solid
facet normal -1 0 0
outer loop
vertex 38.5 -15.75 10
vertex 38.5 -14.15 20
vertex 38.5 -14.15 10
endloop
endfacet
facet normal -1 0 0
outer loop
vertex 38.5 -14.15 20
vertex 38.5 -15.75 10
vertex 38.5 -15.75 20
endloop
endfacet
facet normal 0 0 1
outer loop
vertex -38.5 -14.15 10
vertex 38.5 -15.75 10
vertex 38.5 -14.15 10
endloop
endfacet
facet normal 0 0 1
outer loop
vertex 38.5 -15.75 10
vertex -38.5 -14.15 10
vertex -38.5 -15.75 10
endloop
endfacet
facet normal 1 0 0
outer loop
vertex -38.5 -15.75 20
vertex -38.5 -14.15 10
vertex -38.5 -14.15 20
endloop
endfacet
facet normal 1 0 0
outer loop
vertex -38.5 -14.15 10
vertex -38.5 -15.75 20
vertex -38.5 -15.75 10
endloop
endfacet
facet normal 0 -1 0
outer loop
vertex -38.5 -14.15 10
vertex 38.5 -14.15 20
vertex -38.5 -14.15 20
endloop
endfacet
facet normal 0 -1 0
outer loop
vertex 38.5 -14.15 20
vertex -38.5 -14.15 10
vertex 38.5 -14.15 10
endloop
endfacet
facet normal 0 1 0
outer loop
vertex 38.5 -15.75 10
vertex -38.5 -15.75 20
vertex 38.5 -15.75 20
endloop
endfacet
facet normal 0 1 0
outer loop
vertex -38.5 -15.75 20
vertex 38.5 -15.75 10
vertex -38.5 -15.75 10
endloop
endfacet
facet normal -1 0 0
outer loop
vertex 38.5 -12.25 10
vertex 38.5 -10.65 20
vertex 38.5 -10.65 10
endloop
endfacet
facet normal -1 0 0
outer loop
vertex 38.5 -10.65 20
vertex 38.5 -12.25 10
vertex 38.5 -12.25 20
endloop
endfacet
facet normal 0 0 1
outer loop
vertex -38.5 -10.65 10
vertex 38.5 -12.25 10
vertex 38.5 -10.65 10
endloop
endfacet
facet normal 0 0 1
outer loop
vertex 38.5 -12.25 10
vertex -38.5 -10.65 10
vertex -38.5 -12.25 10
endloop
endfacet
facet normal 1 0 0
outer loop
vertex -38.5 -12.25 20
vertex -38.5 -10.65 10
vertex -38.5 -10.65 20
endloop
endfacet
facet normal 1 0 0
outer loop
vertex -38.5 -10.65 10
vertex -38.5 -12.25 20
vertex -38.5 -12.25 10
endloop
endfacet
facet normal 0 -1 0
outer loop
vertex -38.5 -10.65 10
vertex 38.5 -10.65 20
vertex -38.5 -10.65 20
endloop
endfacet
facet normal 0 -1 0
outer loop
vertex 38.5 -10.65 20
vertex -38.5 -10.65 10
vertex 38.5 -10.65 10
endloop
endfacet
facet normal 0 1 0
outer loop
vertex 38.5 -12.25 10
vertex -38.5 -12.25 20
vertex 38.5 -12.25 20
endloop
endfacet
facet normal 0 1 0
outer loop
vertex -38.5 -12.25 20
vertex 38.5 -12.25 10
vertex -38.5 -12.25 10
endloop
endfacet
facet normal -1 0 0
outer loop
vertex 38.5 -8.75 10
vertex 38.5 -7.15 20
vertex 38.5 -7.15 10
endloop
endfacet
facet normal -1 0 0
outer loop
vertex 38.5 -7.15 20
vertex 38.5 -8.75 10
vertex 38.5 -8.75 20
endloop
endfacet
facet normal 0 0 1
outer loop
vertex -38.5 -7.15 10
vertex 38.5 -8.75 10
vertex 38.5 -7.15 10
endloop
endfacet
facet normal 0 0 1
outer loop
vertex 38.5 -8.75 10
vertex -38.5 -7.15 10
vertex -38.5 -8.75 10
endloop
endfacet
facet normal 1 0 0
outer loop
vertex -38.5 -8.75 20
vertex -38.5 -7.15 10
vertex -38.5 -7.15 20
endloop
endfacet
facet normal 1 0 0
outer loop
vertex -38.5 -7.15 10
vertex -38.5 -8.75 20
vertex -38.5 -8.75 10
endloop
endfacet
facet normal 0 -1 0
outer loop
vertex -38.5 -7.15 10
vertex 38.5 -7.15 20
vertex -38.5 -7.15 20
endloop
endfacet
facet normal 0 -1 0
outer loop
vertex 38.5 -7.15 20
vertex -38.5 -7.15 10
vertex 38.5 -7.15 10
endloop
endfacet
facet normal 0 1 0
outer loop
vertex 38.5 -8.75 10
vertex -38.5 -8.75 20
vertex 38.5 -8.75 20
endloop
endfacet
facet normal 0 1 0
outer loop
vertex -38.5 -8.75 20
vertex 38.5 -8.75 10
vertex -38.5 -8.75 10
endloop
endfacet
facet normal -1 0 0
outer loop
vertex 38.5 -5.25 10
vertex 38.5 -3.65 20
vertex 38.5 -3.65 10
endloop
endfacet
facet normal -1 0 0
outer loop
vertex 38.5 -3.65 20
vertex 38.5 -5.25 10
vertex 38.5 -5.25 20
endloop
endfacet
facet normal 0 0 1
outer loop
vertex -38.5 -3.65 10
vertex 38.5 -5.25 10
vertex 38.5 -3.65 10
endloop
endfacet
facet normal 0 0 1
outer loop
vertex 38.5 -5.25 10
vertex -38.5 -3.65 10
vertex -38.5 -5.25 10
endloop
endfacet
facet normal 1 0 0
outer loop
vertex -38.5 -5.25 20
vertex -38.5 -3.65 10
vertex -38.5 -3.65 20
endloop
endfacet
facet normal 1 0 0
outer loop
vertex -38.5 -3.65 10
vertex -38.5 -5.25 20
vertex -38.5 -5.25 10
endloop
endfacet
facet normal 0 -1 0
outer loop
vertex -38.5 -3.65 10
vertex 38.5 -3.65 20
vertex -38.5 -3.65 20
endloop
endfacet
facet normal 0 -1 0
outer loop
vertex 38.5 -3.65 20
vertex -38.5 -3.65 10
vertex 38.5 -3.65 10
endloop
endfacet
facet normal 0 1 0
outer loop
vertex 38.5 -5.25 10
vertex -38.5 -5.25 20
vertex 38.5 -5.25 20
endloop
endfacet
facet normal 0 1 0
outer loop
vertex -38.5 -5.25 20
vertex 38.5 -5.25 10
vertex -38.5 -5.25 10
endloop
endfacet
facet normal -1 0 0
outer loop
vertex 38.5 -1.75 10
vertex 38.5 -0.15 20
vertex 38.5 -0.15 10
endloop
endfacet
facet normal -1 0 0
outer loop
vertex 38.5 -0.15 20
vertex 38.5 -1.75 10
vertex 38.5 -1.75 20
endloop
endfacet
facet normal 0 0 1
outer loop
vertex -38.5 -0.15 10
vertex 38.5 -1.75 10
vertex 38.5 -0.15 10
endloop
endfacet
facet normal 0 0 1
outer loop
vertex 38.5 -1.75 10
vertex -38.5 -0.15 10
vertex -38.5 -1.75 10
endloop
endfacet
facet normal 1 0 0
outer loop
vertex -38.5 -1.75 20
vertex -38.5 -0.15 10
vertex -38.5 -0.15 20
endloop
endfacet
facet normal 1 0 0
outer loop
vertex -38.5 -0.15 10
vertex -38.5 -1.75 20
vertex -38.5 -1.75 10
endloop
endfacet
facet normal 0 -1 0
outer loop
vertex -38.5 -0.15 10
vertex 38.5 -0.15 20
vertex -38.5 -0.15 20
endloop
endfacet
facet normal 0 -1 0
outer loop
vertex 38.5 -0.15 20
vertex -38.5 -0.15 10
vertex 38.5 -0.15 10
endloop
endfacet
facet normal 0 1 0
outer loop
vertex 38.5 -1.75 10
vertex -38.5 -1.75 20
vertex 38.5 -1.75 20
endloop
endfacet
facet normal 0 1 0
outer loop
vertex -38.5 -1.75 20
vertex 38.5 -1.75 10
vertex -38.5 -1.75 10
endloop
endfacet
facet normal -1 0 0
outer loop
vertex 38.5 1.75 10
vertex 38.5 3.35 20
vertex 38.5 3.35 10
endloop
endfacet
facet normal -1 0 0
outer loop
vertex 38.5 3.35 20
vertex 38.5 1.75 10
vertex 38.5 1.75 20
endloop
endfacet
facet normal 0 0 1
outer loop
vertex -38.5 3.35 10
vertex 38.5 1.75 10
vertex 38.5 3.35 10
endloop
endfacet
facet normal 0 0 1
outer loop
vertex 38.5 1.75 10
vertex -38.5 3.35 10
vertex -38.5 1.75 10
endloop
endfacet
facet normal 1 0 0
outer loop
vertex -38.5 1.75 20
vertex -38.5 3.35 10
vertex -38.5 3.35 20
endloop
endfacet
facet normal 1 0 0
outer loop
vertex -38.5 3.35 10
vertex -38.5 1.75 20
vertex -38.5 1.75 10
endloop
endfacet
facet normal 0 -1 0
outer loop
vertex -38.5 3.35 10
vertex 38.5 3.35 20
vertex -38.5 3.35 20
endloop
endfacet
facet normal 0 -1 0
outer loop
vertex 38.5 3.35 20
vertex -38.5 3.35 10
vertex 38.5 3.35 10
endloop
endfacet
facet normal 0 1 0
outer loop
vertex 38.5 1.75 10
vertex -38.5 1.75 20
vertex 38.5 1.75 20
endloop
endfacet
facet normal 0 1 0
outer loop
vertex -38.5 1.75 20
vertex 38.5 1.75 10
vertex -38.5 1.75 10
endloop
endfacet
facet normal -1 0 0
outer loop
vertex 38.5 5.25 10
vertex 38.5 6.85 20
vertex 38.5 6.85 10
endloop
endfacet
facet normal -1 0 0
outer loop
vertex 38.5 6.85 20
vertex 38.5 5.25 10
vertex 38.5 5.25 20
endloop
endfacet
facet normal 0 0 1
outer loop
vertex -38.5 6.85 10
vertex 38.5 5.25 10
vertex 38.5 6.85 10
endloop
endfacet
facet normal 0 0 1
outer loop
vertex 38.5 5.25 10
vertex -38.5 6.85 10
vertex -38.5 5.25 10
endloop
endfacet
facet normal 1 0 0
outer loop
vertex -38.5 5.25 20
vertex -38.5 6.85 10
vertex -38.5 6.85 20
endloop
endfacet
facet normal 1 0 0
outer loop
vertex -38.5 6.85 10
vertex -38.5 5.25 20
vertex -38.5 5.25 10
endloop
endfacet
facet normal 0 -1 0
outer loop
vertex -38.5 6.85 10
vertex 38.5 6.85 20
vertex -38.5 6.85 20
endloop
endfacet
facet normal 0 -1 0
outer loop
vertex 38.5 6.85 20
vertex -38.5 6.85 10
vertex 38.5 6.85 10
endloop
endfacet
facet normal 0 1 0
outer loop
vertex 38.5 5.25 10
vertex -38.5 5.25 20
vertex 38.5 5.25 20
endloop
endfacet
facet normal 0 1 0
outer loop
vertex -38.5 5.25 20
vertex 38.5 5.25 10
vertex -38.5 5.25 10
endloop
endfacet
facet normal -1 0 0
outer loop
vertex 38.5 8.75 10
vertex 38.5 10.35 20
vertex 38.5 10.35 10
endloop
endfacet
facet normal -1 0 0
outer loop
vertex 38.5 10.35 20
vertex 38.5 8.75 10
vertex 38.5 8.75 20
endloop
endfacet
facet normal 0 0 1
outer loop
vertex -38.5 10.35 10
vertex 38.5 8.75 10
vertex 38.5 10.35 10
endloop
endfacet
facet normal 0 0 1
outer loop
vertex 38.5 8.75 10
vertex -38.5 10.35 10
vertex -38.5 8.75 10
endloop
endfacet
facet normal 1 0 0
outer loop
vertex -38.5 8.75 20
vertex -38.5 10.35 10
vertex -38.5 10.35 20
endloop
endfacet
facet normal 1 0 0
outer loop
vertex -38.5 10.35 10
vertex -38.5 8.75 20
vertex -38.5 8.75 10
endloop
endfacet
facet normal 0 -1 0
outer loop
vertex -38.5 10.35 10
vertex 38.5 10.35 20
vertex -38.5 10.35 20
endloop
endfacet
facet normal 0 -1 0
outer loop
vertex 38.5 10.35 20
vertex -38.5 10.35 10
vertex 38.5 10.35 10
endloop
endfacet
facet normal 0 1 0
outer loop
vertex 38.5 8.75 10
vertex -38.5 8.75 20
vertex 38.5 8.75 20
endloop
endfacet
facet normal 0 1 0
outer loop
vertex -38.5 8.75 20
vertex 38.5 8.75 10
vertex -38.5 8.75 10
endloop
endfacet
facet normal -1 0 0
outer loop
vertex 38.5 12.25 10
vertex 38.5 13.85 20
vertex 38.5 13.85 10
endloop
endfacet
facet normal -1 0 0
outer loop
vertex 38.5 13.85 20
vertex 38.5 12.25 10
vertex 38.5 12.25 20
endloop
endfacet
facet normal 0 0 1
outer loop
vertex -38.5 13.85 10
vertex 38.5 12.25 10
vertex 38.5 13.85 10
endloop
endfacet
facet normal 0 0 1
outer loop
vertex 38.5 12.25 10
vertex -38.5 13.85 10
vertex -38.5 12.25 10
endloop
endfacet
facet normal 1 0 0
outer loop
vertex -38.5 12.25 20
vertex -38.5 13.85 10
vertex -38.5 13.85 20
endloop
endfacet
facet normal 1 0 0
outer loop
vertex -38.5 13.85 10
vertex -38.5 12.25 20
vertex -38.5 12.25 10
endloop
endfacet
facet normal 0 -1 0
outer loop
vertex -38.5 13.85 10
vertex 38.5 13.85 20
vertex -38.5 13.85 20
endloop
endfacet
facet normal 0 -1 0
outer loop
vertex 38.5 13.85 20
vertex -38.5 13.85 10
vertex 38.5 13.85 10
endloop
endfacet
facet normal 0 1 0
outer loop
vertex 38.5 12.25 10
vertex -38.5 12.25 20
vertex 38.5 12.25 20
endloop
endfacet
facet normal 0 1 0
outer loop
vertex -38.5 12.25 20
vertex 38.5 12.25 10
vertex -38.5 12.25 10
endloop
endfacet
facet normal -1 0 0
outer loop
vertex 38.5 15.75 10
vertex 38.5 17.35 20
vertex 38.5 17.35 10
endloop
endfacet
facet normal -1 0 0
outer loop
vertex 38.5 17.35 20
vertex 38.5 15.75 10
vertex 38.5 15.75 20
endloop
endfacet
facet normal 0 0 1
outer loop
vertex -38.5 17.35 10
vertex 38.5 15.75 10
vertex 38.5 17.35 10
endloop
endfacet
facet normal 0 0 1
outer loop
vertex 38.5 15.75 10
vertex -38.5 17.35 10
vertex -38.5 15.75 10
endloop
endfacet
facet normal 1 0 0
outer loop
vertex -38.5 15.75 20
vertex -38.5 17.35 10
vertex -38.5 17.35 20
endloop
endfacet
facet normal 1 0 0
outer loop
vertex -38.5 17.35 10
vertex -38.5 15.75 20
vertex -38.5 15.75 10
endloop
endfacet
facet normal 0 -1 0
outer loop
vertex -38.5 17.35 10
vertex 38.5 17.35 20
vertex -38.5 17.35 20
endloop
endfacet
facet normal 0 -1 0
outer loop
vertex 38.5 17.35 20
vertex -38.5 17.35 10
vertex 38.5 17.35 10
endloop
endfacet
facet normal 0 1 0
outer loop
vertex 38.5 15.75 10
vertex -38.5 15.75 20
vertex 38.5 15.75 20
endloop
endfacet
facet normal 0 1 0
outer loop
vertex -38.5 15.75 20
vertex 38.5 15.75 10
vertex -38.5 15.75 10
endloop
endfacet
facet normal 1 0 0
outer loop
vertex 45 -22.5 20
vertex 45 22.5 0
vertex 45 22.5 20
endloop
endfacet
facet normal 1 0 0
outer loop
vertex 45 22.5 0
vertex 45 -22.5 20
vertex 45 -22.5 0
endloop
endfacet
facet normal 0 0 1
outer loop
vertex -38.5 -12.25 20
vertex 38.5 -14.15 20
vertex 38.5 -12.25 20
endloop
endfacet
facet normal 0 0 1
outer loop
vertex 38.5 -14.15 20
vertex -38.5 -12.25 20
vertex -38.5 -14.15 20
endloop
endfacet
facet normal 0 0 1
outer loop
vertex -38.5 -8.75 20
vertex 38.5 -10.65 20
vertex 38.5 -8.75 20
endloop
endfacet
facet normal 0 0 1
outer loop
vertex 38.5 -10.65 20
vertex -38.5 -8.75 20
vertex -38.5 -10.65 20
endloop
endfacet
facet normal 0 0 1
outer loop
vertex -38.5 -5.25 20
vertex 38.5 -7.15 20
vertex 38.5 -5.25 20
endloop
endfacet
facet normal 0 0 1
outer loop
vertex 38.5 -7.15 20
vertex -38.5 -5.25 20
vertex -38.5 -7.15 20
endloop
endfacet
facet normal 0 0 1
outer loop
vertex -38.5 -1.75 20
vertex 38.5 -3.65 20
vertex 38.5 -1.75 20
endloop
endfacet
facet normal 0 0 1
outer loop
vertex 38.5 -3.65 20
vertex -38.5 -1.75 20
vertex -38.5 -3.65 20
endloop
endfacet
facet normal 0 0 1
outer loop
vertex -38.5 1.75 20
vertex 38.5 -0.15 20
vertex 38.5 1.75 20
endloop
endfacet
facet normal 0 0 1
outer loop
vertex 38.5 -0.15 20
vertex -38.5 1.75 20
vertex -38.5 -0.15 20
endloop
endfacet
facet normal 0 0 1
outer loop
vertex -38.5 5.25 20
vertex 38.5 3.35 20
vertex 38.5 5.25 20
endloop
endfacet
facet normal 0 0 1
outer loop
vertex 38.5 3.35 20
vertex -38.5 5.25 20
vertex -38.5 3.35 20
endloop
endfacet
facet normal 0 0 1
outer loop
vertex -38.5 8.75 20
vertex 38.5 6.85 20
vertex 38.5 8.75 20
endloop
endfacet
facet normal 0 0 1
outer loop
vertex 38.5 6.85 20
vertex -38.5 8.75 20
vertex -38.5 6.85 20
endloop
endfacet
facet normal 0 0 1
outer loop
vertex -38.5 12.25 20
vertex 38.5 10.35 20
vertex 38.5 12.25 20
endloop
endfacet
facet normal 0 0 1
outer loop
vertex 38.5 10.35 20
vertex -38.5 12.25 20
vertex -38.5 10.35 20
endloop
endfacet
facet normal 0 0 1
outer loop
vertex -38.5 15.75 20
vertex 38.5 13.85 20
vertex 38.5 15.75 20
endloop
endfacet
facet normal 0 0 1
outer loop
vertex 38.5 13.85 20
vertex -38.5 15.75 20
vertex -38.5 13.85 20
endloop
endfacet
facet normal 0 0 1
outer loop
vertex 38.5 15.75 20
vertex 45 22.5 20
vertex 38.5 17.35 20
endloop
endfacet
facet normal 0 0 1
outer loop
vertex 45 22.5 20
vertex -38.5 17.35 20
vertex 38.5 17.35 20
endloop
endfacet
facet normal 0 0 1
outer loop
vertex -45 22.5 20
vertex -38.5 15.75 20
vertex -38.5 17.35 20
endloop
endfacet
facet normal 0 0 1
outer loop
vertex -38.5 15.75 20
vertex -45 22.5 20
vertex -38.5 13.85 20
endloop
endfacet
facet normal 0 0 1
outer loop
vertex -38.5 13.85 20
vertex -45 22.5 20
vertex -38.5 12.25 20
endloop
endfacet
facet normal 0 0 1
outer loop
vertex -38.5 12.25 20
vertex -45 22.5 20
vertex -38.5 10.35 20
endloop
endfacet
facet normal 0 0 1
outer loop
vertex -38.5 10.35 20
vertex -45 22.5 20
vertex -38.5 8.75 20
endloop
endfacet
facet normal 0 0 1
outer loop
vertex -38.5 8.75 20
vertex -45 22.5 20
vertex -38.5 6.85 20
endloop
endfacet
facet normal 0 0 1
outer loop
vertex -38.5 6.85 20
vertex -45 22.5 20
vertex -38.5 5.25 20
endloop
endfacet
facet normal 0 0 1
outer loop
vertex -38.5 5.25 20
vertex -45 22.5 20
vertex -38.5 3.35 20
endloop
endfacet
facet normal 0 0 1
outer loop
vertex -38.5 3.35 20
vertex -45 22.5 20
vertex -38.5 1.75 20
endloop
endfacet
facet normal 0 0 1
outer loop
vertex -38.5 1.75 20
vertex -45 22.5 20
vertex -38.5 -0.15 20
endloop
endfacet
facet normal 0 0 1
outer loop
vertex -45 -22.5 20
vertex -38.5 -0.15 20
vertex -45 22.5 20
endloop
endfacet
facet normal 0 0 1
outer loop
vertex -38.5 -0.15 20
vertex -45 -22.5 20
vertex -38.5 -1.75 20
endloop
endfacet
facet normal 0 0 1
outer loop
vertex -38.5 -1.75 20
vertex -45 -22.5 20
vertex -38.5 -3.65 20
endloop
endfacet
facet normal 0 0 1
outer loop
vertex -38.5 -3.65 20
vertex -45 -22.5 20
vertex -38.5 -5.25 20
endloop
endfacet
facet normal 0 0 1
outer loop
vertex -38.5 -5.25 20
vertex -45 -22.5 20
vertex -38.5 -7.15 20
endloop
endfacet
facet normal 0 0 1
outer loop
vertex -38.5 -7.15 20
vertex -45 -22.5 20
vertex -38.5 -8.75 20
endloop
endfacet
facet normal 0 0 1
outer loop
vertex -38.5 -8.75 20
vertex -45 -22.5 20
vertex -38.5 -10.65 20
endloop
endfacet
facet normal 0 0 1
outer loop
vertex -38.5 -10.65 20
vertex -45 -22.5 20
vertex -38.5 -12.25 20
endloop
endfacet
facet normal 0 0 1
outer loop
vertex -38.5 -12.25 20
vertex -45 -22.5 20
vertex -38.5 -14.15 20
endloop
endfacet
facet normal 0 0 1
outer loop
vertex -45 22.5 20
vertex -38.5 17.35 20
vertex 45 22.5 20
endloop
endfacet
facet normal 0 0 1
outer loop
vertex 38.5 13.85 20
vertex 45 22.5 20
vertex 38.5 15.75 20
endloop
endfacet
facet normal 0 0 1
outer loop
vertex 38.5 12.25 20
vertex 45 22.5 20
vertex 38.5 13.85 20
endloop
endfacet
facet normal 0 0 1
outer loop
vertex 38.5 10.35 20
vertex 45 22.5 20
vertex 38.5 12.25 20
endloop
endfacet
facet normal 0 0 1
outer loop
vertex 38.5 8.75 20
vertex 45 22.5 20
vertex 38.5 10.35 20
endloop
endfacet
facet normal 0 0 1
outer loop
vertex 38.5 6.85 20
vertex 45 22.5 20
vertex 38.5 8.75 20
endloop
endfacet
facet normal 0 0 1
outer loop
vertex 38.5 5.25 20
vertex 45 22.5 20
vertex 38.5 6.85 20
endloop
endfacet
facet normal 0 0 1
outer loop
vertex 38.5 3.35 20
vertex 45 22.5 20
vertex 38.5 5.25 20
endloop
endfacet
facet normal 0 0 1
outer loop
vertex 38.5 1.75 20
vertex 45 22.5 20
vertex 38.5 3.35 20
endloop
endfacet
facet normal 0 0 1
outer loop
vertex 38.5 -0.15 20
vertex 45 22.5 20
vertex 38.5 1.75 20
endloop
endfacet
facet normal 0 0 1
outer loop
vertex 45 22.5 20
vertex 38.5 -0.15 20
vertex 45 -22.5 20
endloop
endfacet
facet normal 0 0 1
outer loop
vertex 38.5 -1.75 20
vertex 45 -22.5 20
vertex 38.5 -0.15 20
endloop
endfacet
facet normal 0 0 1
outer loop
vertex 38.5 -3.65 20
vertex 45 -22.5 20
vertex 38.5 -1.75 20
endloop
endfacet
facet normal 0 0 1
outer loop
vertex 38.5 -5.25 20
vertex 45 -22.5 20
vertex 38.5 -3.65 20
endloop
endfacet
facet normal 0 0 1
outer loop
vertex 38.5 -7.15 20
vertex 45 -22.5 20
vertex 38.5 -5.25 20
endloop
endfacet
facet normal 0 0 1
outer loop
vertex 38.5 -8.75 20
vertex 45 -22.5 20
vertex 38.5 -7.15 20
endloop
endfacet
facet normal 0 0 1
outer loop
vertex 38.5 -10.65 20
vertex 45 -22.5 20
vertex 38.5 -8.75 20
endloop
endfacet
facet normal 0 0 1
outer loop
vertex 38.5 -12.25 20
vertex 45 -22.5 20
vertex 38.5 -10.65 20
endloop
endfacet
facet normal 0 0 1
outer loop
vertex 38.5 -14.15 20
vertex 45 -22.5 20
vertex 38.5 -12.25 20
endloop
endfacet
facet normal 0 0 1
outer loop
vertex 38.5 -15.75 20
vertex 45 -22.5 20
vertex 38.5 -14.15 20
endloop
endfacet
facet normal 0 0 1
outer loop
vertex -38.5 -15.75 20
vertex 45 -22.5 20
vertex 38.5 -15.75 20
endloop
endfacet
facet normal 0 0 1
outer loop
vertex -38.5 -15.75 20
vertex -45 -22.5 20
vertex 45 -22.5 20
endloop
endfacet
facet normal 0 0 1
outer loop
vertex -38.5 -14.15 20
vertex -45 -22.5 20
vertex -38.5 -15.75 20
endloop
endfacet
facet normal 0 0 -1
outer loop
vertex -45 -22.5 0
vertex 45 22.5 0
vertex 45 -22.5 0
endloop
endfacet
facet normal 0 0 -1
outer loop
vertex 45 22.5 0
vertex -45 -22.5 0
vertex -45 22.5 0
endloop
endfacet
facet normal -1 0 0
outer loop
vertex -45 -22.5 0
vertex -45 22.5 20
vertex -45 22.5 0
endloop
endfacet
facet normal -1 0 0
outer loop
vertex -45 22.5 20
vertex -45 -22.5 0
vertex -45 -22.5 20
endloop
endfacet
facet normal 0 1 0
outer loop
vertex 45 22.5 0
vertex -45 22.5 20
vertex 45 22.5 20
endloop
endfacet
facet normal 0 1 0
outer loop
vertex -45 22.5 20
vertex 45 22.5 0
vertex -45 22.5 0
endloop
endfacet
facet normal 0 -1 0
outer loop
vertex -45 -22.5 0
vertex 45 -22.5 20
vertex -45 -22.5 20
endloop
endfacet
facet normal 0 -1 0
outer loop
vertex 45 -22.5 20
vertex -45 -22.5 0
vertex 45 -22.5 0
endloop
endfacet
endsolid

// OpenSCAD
// Microscope slide drying rack
// Units: mm

// ---- Block ----
block_l = 90;      // block length (X)
block_w = 45;      // block width (Y)
block_h = 20;      // block height (Z)

// ---- Slots ----
slot_n     = 10;   // number of slots
slot_len   = 77;   // slot length along X
slot_w     = 1.6;  // slot width along Y
slot_d     = 10;   // slot depth from top face
slot_pitch = 3.5;  // centre-to-centre spacing along Y

// ---- Cut clearance ----
eps = 0.5;         // overshoot so cuts pass through the top face

$fn = 64;

difference() {
    // Base block, centred in X/Y, resting on z = 0
    translate([-block_l/2, -block_w/2, 0])
        cube([block_l, block_w, block_h]);

    // Row of parallel slots, centred on the block
    for (i = [0 : slot_n - 1]) {
        y = (i - (slot_n - 1)/2) * slot_pitch;
        translate([-slot_len/2, y, block_h - slot_d])
            cube([slot_len, slot_w, slot_d + eps]);
    }
}
